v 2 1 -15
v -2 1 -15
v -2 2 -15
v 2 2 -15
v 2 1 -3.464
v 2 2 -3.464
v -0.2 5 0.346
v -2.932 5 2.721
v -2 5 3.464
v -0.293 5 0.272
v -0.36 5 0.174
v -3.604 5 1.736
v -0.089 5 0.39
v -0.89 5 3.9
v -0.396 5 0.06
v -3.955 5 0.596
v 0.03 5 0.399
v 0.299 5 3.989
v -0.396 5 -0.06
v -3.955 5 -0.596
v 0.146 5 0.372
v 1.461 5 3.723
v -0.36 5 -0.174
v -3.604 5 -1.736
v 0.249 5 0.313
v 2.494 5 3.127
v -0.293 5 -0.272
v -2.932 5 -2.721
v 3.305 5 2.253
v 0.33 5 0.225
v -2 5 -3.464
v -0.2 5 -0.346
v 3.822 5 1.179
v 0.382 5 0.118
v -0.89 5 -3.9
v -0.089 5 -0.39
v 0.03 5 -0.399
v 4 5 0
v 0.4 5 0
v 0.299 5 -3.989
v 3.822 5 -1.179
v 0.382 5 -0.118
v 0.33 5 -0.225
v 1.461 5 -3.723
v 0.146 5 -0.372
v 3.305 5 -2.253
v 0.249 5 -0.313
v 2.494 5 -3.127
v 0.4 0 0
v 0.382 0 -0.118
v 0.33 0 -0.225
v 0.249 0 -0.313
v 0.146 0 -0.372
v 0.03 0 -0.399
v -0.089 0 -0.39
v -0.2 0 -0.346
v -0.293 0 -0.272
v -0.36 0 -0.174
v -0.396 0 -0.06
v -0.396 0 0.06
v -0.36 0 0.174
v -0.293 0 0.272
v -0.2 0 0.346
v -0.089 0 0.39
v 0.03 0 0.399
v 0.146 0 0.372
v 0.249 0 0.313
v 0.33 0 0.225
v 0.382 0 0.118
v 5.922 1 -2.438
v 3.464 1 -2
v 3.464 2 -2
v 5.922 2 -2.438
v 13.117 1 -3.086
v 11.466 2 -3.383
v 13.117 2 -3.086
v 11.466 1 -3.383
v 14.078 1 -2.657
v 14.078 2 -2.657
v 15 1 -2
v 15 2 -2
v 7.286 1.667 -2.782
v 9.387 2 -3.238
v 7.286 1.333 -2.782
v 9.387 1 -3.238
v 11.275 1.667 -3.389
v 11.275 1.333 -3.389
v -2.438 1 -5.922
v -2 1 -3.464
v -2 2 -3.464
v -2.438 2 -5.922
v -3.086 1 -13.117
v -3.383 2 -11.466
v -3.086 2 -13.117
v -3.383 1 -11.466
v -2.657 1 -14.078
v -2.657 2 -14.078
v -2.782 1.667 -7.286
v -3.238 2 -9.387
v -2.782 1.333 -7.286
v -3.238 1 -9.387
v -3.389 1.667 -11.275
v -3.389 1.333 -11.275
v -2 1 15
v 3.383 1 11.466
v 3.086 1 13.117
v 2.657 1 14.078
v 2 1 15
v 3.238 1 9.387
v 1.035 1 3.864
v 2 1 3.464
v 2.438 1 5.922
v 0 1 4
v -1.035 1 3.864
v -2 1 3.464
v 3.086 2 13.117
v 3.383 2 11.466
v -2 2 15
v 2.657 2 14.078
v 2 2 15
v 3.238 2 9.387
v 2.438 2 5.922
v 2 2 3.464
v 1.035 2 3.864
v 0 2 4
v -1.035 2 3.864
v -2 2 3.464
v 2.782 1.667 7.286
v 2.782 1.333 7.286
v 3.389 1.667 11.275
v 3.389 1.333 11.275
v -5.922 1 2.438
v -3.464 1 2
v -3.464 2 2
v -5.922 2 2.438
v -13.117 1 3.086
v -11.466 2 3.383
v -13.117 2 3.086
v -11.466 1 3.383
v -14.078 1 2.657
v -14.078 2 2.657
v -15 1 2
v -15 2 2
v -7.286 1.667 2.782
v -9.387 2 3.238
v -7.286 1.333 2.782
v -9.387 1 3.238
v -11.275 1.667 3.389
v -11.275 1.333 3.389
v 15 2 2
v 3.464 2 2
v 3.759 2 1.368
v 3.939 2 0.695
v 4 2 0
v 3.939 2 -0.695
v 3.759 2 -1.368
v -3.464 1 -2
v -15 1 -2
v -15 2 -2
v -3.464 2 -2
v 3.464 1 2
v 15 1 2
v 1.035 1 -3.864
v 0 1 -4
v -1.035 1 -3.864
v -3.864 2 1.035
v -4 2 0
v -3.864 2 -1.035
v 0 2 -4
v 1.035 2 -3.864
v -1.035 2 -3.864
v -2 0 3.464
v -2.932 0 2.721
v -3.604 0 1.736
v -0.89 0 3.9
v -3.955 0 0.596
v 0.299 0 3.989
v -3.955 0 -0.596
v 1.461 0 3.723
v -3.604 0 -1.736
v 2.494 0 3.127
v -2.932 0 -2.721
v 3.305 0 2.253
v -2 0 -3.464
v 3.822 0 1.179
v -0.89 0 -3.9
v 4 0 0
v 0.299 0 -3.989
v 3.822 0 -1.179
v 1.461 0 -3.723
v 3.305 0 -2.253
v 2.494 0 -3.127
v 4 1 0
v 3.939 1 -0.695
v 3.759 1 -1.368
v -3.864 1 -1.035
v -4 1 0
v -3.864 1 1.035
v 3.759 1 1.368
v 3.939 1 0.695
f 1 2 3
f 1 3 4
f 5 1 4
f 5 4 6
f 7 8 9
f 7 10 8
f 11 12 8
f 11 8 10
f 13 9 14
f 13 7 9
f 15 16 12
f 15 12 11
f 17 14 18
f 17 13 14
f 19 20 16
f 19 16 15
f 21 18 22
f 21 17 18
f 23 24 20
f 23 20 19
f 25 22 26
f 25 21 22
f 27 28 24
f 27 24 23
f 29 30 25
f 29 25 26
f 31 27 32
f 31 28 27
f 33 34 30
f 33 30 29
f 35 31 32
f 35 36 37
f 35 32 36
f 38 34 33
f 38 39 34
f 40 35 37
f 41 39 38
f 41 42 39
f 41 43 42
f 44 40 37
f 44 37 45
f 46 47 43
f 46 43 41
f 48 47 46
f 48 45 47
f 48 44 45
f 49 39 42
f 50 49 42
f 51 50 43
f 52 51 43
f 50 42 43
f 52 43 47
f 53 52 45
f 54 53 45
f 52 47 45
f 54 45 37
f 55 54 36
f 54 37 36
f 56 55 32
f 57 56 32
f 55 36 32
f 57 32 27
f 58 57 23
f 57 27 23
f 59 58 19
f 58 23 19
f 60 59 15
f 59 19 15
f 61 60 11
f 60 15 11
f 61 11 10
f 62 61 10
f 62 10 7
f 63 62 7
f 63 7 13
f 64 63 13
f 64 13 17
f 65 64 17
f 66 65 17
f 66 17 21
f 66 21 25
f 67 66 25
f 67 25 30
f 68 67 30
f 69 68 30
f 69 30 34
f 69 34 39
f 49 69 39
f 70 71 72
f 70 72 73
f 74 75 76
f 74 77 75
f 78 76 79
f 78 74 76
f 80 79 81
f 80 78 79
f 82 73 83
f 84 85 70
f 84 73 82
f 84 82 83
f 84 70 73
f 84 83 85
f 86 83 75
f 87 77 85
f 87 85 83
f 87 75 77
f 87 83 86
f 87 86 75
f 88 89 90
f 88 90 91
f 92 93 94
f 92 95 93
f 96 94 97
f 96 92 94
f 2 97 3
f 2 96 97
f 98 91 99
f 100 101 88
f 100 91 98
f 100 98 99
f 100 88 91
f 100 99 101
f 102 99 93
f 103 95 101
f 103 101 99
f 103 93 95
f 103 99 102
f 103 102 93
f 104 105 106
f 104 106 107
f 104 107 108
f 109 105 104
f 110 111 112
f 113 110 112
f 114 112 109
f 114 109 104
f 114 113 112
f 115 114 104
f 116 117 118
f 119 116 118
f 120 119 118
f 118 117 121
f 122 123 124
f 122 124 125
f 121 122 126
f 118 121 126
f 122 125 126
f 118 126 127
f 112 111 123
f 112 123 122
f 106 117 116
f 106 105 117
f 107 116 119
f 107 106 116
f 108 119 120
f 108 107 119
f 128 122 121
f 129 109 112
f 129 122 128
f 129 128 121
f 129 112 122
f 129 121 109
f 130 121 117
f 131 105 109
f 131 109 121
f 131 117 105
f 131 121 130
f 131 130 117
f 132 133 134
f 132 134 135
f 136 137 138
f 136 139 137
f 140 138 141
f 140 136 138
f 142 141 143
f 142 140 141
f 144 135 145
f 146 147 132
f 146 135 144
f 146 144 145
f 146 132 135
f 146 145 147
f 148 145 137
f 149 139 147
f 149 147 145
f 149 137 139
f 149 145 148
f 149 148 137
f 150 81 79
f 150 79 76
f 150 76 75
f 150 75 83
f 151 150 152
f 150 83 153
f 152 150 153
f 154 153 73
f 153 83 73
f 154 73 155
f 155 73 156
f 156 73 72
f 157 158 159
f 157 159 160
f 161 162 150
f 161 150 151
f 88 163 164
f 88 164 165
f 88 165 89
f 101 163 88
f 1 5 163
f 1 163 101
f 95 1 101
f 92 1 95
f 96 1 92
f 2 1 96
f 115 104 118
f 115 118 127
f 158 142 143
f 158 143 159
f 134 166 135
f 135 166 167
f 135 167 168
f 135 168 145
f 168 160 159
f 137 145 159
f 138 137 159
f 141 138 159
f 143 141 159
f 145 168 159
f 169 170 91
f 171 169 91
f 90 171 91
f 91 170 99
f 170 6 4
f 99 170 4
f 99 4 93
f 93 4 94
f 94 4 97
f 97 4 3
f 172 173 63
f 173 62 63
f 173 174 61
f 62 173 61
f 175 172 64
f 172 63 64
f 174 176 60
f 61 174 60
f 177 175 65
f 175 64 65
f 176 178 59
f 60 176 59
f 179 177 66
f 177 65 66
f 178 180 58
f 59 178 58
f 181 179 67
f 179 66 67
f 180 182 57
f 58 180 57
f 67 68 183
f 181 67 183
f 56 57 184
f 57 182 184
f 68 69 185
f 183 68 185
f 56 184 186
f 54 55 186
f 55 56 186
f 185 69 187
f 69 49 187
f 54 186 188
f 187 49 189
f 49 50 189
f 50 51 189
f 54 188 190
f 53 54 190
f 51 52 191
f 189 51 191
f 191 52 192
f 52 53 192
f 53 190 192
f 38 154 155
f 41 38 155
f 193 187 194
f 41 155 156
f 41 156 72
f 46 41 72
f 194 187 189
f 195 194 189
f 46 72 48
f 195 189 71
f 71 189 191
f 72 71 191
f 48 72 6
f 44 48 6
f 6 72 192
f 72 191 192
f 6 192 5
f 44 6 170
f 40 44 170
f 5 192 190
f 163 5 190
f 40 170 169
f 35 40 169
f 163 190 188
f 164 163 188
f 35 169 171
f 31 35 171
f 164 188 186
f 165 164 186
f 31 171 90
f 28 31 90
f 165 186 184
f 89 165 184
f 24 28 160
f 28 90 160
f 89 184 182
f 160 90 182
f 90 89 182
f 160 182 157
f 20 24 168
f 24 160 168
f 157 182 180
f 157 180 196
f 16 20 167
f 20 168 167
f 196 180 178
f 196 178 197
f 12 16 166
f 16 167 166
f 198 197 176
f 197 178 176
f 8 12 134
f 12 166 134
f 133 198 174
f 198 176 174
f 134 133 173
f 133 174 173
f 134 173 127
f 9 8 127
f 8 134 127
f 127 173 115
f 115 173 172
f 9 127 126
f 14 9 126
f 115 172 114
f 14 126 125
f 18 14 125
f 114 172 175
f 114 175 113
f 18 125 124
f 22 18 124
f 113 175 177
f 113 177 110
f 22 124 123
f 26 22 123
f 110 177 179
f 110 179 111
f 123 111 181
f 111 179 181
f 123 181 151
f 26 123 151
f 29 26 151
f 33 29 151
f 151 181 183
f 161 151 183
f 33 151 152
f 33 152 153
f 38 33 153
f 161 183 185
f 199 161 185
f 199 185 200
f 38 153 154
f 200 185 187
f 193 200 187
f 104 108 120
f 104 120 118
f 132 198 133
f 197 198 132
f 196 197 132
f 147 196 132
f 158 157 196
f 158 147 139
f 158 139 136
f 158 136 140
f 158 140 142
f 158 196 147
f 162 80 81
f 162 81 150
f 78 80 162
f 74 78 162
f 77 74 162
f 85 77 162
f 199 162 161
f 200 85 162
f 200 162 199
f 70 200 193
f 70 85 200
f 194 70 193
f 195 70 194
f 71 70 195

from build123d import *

# Parameters (mm, degrees)
SKETCH1_R               = 4
BOSS_EXTRUDE1_DEPTH     = 5
BOSS_EXTRUDE2_START     = 1
BOSS_EXTRUDE2_DEPTH     = 1
SKETCH3_R               = 0.4
CUT_EXTRUDE1_DEPTH      = 1
CUT_EXTRUDE1_DEPTH_BACK = 6


with BuildPart() as part:
    # Sketch1 → Boss-Extrude1 (new body)
    with BuildSketch(Plane(origin=(0, 0, 0), x_dir=(1, 0, 0), z_dir=(0, 1, 0))):
        Circle(SKETCH1_R)
    extrude(amount=BOSS_EXTRUDE1_DEPTH)

    # Sketch2 → Boss-Extrude2 (add)
    with BuildSketch(Plane(origin=(0, 0, 0), x_dir=(1, 0, 0), z_dir=(0, 1, 0)).offset(BOSS_EXTRUDE2_START)):
        with BuildLine():
            Line((15, -2), (3.464101615, -2))
            ThreePointArc((3.464101615, -2), (4, 0), (3.464101615, 2))
            add(Edge.make_bspline(
                [(3.464101615, 2), (7.059911859, 2.261875705), (11.549393059, 4.995376959), (15, 2)],
                knots=[0, 0, 0, 0, 1, 1, 1, 1], degree=3))
            Line((15, 2), (15, 0))
            Line((15, 0), (15, -2))
        make_face()
        with BuildLine():
            Line((2, -15), (0, -15))
            Line((0, -15), (-2, -15))
            Line((-2, -15), (-2, -3.464101615))
            ThreePointArc((-2, -3.464101615), (0, -4), (2, -3.464101615))
            add(Edge.make_bspline(
                [(2, -3.464101615), (2.261875705, -7.059911859), (4.995376959, -11.549393059), (2, -15)],
                knots=[0, 0, 0, 0, 1, 1, 1, 1], degree=3))
        make_face()
        with BuildLine():
            Line((-15, -2), (-15, 0))
            Line((-15, 0), (-15, 2))
            Line((-15, 2), (-3.464101615, 2))
            ThreePointArc((-3.464101615, 2), (-4, 0), (-3.464101615, -2))
            add(Edge.make_bspline(
                [(-3.464101615, -2), (-7.059911859, -2.261875705), (-11.549393059, -4.995376959), (-15, -2)],
                knots=[0, 0, 0, 0, 1, 1, 1, 1], degree=3))
        make_face()
        with BuildLine():
            Line((-2, 15), (0, 15))
            Line((0, 15), (2, 15))
            Line((2, 15), (2, 3.464101615))
            ThreePointArc((2, 3.464101615), (0, 4), (-2, 3.464101615))
            add(Edge.make_bspline(
                [(-2, 3.464101615), (-2.261875705, 7.059911859), (-4.995376959, 11.549393059), (-2, 15)],
                knots=[0, 0, 0, 0, 1, 1, 1, 1], degree=3))
        make_face()
    extrude(amount=BOSS_EXTRUDE2_DEPTH)

    # Sketch3 → Cut-Extrude1 (cut, two sides)
    with BuildSketch(Plane(origin=(0, 5, 0), x_dir=(1, 0, 0), z_dir=(0, 1, 0))) as cut_extrude1_sk:
        Circle(SKETCH3_R)
    extrude(amount=CUT_EXTRUDE1_DEPTH, mode=Mode.SUBTRACT)
    extrude(cut_extrude1_sk.sketch, amount=-CUT_EXTRUDE1_DEPTH_BACK, mode=Mode.SUBTRACT)


solid = part.part
